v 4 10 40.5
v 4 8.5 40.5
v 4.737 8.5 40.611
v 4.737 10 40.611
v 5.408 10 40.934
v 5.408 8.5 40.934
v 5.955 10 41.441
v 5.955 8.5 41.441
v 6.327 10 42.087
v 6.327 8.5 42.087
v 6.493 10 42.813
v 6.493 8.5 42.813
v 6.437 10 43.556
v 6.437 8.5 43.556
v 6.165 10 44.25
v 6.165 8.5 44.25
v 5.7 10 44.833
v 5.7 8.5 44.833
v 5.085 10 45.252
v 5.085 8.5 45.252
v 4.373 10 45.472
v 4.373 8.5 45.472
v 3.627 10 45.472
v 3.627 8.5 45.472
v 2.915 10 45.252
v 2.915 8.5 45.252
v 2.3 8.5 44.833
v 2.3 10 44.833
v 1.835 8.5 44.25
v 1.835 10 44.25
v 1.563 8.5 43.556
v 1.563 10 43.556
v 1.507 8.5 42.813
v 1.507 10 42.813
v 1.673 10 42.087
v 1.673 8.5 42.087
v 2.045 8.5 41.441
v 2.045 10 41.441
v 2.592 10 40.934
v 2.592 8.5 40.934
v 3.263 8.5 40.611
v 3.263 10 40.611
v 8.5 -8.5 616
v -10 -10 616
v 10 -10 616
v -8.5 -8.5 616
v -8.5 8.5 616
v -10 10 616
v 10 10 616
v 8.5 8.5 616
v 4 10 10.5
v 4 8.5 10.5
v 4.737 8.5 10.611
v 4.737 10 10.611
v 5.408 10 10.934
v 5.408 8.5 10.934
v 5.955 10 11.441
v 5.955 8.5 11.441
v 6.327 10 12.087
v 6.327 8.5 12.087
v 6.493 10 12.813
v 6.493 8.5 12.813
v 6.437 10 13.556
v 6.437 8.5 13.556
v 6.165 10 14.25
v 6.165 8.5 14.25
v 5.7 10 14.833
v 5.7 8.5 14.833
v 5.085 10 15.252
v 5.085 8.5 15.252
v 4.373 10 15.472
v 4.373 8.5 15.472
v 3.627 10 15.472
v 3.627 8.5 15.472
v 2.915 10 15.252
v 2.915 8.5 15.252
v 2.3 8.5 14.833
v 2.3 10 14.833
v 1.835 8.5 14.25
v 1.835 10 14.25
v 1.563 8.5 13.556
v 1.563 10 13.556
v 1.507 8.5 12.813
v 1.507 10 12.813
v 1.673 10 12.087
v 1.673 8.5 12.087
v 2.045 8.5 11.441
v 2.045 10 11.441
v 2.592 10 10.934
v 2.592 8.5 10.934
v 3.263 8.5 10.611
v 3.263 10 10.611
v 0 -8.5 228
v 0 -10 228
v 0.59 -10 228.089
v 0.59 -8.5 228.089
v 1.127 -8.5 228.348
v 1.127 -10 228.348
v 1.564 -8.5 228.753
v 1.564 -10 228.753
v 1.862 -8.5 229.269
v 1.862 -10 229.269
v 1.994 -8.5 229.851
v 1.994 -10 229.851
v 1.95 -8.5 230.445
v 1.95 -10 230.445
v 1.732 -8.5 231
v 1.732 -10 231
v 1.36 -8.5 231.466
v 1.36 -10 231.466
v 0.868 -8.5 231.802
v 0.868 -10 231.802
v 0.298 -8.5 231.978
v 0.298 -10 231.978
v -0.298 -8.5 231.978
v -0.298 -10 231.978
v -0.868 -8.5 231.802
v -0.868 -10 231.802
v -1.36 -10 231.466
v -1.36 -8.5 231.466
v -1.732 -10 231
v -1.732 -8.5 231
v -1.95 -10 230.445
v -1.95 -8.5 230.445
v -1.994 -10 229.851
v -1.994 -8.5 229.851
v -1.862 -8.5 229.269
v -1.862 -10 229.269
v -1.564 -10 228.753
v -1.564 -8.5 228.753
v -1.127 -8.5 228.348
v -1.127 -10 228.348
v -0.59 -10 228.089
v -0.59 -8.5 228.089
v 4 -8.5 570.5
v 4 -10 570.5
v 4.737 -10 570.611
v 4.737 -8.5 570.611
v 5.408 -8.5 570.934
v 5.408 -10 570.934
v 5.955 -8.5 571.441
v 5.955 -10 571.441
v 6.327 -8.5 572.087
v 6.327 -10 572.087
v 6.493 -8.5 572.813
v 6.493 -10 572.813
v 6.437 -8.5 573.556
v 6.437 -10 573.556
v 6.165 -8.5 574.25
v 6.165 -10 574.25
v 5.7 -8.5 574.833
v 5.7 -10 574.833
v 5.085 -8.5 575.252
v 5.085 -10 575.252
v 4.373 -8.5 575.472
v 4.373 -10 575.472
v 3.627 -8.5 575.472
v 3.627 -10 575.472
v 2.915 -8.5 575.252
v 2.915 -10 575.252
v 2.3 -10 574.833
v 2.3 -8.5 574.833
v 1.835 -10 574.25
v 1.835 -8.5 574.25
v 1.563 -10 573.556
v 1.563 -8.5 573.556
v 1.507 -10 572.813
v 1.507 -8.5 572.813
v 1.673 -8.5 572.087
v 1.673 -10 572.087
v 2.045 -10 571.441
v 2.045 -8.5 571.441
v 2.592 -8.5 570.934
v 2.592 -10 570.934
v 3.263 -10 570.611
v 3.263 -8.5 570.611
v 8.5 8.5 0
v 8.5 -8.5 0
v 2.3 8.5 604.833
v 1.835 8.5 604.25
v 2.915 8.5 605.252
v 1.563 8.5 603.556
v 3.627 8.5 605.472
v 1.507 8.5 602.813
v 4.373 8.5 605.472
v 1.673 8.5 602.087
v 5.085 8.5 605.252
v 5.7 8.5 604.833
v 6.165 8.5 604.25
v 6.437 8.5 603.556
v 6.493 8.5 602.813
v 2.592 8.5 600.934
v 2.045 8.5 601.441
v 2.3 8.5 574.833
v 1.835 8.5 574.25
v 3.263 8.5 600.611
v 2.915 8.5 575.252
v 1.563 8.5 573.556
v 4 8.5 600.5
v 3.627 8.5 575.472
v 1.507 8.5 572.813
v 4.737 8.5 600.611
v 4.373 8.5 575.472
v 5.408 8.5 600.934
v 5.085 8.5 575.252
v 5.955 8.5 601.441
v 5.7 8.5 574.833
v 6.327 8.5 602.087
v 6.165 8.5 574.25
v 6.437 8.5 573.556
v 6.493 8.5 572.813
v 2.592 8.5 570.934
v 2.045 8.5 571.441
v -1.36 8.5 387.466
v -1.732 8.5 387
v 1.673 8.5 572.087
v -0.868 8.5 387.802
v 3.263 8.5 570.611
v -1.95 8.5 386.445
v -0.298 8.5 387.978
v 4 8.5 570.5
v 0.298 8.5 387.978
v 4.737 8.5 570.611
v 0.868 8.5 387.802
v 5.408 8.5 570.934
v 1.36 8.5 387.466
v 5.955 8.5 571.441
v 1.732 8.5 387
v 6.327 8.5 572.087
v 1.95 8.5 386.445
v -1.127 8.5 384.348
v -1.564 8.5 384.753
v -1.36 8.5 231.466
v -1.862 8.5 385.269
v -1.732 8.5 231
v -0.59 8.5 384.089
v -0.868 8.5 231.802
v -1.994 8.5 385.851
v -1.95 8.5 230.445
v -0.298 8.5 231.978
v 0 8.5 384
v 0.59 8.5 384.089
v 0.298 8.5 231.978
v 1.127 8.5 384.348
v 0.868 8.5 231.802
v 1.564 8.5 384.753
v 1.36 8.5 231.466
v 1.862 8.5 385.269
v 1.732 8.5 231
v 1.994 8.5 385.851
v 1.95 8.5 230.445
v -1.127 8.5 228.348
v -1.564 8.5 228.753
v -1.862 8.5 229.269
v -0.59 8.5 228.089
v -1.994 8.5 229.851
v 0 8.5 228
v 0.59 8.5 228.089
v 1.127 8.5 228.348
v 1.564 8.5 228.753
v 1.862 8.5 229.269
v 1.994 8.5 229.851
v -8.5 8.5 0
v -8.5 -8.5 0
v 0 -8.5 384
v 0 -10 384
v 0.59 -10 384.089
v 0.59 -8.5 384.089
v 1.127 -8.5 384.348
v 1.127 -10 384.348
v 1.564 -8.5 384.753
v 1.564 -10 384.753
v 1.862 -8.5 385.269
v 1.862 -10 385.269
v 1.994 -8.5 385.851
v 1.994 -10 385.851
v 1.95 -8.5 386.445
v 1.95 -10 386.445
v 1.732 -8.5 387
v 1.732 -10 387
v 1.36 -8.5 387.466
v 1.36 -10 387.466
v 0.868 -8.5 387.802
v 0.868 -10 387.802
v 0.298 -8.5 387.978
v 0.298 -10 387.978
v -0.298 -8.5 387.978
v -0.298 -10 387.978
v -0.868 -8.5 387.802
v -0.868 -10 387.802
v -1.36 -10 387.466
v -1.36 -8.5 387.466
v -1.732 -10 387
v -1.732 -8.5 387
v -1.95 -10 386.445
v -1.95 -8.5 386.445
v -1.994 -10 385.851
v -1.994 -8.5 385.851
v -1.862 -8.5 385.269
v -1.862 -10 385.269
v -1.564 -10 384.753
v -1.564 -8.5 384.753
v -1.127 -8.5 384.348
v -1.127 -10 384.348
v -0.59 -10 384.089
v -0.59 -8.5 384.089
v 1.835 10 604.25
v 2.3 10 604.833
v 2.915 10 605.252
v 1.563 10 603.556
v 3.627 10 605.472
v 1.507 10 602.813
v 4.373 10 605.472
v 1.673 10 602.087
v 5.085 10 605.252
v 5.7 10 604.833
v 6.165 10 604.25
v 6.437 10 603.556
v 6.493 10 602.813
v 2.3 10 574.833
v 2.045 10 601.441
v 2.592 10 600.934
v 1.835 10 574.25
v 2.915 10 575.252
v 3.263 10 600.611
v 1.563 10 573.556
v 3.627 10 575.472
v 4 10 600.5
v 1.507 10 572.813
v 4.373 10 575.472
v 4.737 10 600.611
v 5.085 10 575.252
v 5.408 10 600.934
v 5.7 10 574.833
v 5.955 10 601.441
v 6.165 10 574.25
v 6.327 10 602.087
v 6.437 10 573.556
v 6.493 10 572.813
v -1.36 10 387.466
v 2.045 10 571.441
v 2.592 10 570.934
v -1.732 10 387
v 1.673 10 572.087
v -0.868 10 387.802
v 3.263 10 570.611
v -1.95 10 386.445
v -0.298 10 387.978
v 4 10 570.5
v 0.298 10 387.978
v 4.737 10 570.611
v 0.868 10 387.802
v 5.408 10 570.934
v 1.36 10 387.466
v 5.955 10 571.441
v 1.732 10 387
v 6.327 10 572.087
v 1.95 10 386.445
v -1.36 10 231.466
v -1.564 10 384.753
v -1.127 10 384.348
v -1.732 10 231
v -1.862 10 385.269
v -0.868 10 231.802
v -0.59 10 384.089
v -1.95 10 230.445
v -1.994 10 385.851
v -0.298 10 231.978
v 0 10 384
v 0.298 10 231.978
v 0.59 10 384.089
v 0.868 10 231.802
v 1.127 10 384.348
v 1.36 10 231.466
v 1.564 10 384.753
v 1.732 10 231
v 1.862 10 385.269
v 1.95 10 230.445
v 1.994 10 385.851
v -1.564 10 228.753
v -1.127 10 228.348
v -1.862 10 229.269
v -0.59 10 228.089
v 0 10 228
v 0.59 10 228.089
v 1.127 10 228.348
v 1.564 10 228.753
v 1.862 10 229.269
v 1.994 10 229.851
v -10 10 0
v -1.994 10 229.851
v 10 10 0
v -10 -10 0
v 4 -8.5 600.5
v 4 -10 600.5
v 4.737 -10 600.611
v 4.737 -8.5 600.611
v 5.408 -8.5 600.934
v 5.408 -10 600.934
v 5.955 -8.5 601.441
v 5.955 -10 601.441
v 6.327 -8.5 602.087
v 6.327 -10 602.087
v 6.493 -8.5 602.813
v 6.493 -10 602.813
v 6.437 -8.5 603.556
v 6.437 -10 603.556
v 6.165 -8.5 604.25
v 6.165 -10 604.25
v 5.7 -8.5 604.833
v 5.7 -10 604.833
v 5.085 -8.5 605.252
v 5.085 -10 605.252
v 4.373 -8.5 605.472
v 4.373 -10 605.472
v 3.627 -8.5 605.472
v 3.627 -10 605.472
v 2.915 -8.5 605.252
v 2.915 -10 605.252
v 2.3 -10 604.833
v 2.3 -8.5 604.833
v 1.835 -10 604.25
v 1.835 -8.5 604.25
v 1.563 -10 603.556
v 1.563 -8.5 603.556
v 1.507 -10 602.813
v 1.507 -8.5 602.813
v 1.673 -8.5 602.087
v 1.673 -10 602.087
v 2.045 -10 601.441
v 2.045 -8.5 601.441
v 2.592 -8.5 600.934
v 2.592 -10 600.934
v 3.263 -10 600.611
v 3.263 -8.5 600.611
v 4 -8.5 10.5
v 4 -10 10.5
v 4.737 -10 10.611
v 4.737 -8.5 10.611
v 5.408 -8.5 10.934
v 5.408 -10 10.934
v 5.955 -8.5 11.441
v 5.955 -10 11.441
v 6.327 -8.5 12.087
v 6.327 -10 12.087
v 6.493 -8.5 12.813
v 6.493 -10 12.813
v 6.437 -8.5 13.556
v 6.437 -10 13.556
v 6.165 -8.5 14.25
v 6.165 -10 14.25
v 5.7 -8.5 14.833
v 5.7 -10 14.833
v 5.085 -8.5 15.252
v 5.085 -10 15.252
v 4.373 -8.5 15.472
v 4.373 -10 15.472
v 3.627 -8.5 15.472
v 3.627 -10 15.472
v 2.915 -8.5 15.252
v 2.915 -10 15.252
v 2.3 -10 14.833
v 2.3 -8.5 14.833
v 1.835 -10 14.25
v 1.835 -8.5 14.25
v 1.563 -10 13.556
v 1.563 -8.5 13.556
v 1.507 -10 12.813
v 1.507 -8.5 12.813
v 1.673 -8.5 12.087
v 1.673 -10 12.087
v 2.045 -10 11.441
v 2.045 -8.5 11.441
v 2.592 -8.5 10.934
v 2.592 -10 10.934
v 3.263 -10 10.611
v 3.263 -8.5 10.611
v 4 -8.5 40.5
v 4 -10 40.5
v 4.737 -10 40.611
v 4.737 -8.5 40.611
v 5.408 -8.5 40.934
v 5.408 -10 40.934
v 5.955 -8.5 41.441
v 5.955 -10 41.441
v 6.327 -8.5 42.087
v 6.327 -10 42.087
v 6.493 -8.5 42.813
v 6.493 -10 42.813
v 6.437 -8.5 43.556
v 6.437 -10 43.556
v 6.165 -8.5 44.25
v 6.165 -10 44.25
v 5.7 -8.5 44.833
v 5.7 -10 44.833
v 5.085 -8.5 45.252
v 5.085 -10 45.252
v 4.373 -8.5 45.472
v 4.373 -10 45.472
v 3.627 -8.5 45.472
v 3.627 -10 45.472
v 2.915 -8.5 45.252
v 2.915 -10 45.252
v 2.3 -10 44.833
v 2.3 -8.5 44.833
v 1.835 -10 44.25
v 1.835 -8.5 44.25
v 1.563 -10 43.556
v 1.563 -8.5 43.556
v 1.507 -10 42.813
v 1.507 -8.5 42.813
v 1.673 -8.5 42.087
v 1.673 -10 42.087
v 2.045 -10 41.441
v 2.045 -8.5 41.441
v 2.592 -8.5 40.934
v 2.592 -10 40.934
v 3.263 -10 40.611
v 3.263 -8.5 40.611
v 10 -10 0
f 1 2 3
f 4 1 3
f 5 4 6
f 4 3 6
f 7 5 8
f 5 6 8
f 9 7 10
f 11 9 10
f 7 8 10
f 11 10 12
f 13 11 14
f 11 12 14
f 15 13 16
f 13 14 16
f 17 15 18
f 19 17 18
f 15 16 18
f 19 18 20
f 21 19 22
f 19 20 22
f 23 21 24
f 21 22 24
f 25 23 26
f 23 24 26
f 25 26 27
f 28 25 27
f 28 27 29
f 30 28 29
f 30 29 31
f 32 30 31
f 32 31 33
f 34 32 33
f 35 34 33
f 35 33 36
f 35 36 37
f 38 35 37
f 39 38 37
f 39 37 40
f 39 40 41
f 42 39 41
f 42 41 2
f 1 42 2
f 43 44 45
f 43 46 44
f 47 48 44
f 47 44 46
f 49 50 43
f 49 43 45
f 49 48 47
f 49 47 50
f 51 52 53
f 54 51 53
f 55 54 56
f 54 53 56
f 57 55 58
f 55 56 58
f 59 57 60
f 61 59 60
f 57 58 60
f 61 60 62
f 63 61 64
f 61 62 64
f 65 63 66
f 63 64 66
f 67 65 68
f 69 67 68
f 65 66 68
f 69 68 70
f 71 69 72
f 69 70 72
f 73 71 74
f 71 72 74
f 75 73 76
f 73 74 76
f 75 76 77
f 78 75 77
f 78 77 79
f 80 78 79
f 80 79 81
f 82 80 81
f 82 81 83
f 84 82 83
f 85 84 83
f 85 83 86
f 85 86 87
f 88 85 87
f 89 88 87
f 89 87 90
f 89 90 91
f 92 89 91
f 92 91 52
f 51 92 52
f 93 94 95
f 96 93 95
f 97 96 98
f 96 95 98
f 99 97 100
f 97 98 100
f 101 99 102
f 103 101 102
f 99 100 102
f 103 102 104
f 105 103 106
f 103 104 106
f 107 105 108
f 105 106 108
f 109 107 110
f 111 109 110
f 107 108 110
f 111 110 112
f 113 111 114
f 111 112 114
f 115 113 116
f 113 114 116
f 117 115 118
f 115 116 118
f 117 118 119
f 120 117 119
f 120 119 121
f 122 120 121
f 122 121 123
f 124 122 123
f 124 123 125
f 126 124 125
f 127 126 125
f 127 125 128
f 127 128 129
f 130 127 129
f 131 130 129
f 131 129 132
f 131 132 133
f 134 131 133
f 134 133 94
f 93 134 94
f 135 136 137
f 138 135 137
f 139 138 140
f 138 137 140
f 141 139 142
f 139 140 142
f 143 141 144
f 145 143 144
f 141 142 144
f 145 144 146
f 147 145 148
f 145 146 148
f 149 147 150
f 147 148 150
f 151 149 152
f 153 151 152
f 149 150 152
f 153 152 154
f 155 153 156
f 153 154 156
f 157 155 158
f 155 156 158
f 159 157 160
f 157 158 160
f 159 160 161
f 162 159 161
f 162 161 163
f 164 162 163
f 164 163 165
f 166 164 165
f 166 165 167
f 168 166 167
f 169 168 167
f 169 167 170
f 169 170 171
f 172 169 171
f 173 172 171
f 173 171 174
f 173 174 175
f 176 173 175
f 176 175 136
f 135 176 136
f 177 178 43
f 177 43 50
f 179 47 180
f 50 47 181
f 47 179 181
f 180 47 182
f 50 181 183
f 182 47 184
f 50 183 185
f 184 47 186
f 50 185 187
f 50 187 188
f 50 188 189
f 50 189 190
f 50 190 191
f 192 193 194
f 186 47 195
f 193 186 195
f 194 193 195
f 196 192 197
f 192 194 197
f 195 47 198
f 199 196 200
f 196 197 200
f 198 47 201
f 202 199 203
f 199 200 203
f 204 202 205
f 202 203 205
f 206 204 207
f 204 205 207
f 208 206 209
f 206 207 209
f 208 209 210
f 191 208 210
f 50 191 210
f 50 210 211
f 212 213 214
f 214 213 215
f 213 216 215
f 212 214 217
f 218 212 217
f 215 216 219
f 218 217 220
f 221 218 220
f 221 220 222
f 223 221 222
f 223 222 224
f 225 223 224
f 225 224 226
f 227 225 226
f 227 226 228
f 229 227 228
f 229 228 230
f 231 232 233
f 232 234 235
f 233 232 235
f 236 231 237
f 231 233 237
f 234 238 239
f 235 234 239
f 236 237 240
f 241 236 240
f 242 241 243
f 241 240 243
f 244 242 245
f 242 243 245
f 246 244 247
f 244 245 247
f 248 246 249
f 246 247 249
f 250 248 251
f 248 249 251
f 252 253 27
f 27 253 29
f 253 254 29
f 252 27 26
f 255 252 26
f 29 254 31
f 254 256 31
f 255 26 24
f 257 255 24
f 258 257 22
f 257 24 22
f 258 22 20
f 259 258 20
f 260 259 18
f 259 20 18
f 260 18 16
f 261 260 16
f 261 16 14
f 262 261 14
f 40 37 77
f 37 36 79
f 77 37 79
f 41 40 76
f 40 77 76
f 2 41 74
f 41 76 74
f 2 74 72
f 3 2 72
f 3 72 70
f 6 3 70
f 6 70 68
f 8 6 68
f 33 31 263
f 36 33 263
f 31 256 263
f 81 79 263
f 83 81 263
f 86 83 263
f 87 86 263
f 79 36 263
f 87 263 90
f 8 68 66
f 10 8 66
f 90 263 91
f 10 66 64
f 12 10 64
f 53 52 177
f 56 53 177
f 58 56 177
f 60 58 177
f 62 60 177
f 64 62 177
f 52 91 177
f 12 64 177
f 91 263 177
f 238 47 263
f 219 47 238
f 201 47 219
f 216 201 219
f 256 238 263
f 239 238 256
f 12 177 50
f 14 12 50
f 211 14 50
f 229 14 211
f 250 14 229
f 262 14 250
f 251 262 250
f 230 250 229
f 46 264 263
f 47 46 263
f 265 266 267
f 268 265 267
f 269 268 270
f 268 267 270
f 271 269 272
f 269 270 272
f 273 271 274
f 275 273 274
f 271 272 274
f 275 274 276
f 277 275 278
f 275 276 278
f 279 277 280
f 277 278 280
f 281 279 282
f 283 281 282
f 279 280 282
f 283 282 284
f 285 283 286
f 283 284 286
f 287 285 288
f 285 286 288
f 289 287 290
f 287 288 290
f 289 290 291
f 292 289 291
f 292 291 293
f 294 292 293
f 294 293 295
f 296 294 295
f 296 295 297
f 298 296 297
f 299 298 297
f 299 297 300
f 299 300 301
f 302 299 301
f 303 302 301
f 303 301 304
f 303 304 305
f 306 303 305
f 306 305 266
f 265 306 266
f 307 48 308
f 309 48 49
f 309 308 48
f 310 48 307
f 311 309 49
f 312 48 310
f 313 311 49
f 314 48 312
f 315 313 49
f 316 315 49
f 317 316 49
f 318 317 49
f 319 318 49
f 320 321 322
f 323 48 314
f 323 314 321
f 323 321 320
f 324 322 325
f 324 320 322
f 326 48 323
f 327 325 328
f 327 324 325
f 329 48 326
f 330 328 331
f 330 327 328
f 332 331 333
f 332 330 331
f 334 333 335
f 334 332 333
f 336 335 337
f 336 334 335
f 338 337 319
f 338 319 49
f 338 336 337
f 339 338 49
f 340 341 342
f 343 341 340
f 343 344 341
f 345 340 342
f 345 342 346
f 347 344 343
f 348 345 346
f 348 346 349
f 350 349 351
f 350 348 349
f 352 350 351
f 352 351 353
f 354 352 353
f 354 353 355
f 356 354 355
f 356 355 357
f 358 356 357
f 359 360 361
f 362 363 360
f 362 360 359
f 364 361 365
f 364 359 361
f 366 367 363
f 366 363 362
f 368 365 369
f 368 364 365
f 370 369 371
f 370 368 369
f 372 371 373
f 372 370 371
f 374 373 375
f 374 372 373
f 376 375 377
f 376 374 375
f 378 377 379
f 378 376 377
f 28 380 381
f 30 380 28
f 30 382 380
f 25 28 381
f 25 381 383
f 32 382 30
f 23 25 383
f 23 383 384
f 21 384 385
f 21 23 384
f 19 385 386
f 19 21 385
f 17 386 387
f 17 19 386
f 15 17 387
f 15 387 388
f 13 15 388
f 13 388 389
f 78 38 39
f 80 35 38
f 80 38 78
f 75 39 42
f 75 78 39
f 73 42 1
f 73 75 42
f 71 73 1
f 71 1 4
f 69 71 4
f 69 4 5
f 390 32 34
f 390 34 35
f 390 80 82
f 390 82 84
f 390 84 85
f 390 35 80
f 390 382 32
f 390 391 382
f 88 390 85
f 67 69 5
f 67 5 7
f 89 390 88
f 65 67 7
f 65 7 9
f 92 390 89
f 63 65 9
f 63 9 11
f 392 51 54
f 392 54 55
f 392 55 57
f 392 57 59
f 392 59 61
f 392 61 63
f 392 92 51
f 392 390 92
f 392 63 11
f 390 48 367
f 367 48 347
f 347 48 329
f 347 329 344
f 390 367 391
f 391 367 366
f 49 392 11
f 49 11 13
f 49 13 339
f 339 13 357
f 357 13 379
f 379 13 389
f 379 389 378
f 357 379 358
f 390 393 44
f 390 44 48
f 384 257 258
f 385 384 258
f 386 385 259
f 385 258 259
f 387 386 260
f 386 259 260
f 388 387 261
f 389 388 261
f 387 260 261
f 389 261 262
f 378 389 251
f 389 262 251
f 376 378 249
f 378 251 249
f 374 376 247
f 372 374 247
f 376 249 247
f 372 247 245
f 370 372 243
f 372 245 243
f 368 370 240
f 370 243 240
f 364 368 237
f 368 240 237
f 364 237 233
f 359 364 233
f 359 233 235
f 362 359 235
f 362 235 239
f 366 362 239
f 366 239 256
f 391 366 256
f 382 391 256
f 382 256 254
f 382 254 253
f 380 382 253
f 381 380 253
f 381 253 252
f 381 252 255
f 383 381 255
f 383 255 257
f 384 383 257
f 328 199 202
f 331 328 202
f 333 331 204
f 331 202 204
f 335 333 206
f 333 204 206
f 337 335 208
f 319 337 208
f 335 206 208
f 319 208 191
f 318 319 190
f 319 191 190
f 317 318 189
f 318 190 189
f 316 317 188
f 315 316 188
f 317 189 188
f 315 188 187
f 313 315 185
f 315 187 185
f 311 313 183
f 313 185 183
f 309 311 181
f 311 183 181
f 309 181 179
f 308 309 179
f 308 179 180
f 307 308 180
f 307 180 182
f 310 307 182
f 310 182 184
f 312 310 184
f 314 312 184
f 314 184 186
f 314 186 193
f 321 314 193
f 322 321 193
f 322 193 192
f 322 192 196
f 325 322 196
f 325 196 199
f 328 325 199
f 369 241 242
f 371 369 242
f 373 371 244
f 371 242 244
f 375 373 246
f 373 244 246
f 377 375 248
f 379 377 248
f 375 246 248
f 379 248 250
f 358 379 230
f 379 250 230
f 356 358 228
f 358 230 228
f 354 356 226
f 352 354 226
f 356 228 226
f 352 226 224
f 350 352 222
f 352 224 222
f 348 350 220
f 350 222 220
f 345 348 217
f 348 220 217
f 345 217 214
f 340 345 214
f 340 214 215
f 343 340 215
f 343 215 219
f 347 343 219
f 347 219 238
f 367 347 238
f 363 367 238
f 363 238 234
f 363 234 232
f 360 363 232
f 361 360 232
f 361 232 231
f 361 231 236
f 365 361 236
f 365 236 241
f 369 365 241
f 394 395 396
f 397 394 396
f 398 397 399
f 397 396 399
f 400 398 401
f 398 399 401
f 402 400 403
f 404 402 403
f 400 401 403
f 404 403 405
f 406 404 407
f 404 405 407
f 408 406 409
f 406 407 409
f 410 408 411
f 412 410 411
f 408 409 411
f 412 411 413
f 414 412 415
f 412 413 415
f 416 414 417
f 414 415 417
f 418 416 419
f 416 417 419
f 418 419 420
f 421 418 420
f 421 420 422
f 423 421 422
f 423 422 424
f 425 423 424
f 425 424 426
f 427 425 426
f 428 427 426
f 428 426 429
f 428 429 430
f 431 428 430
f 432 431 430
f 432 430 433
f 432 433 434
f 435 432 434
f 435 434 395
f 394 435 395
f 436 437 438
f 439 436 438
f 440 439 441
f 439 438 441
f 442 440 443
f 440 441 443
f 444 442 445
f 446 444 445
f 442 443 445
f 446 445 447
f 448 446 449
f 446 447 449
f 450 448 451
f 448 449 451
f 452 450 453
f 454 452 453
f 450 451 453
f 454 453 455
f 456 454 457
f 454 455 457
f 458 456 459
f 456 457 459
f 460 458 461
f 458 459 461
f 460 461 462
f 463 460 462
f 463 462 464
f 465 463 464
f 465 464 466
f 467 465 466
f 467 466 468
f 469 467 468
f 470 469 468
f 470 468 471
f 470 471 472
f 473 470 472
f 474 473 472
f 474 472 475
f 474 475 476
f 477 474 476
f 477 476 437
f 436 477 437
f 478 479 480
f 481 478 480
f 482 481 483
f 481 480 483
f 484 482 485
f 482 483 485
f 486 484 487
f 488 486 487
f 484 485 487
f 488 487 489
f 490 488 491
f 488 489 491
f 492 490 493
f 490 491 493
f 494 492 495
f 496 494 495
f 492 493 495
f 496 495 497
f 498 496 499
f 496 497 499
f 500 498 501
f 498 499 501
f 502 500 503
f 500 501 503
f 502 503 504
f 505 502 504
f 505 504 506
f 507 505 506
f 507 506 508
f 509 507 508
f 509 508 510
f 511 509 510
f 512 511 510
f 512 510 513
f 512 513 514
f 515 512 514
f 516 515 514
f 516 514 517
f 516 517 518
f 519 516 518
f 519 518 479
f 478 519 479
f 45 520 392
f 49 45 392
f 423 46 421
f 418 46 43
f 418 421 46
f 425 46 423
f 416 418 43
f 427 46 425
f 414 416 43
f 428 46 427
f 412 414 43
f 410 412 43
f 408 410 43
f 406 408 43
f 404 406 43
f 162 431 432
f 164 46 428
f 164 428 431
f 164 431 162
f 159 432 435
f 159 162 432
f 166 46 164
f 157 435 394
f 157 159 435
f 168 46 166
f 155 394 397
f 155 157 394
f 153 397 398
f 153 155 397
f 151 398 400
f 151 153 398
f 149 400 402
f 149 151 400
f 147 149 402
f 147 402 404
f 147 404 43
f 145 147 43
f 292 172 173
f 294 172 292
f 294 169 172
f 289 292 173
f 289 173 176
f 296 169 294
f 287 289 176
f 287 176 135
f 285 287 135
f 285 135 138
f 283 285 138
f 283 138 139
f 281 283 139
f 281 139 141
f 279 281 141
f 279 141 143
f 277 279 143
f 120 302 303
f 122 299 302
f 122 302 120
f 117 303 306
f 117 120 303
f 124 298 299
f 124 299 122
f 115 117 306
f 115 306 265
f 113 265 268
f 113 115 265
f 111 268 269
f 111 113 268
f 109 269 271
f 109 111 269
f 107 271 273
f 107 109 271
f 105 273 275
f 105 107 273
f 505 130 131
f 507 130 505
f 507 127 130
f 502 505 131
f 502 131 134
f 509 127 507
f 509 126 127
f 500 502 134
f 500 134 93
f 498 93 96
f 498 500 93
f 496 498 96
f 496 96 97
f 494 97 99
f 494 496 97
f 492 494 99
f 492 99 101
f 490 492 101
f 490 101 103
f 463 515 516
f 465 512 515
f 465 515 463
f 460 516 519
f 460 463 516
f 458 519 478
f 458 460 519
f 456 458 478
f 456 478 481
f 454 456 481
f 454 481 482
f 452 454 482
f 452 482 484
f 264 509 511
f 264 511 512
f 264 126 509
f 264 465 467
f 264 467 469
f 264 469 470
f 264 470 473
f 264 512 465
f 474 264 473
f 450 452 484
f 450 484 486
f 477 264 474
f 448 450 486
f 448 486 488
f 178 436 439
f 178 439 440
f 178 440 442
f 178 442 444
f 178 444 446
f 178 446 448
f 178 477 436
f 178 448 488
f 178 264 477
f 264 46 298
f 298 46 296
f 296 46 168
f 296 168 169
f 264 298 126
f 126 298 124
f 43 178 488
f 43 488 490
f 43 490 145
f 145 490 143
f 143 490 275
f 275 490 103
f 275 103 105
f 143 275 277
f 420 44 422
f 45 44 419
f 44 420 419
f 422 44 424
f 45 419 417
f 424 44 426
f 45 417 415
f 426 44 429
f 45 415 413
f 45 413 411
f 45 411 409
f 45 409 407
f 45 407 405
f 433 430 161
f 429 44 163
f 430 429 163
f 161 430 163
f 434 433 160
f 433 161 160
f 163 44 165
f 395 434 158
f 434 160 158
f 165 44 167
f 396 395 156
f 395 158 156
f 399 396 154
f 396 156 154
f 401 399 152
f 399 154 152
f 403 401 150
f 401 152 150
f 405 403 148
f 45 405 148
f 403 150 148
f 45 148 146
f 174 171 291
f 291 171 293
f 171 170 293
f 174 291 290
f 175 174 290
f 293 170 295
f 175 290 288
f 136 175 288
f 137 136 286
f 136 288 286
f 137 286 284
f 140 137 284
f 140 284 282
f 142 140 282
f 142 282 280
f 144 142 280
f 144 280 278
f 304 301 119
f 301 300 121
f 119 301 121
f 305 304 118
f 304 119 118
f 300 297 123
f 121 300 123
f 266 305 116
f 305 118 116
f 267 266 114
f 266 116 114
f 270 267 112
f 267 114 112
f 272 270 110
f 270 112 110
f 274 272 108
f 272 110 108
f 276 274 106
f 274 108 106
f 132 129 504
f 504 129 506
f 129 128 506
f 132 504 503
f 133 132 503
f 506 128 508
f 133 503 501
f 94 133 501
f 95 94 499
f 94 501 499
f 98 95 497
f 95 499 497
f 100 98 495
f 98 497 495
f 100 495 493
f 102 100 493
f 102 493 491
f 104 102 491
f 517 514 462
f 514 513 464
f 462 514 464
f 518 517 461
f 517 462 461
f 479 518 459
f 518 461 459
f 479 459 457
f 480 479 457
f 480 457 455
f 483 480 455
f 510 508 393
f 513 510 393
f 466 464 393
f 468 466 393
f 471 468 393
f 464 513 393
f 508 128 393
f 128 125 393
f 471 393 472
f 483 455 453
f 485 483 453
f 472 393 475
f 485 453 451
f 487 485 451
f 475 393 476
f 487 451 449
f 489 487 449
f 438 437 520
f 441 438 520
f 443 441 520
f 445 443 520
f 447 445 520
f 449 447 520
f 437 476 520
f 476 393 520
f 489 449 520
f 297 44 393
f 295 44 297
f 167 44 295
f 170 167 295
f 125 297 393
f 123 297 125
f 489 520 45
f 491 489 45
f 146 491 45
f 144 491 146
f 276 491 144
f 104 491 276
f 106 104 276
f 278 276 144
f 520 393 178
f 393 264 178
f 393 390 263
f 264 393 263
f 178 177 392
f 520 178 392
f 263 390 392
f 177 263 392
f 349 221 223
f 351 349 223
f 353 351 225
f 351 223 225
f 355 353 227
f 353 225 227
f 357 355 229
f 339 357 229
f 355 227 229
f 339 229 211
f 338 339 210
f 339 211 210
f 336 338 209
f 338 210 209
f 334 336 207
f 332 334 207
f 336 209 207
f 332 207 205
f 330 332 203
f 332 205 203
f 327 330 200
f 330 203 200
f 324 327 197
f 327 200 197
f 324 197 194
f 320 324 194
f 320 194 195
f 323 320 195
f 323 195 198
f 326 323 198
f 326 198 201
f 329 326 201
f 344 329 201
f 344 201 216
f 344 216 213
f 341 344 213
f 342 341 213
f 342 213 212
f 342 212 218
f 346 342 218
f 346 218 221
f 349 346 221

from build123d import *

# Parameters (mm, degrees)
SKETCH_1_W          = 20
SKETCH_1_H          = 20
SKETCH_1_W_2        = 17
SKETCH_1_H_2        = 17
EXTRUDE_1_DEPTH     = 616
SKETCH_4_R          = 2.5
CUT_EXTRUDE_3_DEPTH = 20
SKETCH_5_R          = 2
CUT_EXTRUDE_4_DEPTH = 20


with BuildPart() as part:
    # 草图1 → 凸台-拉伸1 (new body)
    with BuildSketch(Plane.XY):
        Rectangle(SKETCH_1_W, SKETCH_1_H)
        Rectangle(SKETCH_1_W_2, SKETCH_1_H_2, mode=Mode.SUBTRACT)
    extrude(amount=EXTRUDE_1_DEPTH)

    # 草图4 → 切除-拉伸3 (cut)
    with BuildSketch(Plane.XZ.offset(10)):
        with Locations(Location((4, 13, 0), (0, 0, 270))):
            Circle(SKETCH_4_R)
        with Locations(Location((4, 43, 0), (0, 0, 270))):
            Circle(SKETCH_4_R)
        with Locations(Location((4, 603, 0), (0, 0, 270))):
            Circle(SKETCH_4_R)
        with Locations(Location((4, 573, 0), (0, 0, 270))):
            Circle(SKETCH_4_R)
    extrude(amount=-CUT_EXTRUDE_3_DEPTH, mode=Mode.SUBTRACT)

    # 草图5 → 切除-拉伸4 (cut)
    with BuildSketch(Plane.XZ.offset(10)):
        with Locations(Location((0, 230, 0), (0, 0, 270))):
            Circle(SKETCH_5_R)
        with Locations(Location((0, 386, 0), (0, 0, 270))):
            Circle(SKETCH_5_R)
    extrude(amount=-CUT_EXTRUDE_4_DEPTH, mode=Mode.SUBTRACT)


solid = part.part
